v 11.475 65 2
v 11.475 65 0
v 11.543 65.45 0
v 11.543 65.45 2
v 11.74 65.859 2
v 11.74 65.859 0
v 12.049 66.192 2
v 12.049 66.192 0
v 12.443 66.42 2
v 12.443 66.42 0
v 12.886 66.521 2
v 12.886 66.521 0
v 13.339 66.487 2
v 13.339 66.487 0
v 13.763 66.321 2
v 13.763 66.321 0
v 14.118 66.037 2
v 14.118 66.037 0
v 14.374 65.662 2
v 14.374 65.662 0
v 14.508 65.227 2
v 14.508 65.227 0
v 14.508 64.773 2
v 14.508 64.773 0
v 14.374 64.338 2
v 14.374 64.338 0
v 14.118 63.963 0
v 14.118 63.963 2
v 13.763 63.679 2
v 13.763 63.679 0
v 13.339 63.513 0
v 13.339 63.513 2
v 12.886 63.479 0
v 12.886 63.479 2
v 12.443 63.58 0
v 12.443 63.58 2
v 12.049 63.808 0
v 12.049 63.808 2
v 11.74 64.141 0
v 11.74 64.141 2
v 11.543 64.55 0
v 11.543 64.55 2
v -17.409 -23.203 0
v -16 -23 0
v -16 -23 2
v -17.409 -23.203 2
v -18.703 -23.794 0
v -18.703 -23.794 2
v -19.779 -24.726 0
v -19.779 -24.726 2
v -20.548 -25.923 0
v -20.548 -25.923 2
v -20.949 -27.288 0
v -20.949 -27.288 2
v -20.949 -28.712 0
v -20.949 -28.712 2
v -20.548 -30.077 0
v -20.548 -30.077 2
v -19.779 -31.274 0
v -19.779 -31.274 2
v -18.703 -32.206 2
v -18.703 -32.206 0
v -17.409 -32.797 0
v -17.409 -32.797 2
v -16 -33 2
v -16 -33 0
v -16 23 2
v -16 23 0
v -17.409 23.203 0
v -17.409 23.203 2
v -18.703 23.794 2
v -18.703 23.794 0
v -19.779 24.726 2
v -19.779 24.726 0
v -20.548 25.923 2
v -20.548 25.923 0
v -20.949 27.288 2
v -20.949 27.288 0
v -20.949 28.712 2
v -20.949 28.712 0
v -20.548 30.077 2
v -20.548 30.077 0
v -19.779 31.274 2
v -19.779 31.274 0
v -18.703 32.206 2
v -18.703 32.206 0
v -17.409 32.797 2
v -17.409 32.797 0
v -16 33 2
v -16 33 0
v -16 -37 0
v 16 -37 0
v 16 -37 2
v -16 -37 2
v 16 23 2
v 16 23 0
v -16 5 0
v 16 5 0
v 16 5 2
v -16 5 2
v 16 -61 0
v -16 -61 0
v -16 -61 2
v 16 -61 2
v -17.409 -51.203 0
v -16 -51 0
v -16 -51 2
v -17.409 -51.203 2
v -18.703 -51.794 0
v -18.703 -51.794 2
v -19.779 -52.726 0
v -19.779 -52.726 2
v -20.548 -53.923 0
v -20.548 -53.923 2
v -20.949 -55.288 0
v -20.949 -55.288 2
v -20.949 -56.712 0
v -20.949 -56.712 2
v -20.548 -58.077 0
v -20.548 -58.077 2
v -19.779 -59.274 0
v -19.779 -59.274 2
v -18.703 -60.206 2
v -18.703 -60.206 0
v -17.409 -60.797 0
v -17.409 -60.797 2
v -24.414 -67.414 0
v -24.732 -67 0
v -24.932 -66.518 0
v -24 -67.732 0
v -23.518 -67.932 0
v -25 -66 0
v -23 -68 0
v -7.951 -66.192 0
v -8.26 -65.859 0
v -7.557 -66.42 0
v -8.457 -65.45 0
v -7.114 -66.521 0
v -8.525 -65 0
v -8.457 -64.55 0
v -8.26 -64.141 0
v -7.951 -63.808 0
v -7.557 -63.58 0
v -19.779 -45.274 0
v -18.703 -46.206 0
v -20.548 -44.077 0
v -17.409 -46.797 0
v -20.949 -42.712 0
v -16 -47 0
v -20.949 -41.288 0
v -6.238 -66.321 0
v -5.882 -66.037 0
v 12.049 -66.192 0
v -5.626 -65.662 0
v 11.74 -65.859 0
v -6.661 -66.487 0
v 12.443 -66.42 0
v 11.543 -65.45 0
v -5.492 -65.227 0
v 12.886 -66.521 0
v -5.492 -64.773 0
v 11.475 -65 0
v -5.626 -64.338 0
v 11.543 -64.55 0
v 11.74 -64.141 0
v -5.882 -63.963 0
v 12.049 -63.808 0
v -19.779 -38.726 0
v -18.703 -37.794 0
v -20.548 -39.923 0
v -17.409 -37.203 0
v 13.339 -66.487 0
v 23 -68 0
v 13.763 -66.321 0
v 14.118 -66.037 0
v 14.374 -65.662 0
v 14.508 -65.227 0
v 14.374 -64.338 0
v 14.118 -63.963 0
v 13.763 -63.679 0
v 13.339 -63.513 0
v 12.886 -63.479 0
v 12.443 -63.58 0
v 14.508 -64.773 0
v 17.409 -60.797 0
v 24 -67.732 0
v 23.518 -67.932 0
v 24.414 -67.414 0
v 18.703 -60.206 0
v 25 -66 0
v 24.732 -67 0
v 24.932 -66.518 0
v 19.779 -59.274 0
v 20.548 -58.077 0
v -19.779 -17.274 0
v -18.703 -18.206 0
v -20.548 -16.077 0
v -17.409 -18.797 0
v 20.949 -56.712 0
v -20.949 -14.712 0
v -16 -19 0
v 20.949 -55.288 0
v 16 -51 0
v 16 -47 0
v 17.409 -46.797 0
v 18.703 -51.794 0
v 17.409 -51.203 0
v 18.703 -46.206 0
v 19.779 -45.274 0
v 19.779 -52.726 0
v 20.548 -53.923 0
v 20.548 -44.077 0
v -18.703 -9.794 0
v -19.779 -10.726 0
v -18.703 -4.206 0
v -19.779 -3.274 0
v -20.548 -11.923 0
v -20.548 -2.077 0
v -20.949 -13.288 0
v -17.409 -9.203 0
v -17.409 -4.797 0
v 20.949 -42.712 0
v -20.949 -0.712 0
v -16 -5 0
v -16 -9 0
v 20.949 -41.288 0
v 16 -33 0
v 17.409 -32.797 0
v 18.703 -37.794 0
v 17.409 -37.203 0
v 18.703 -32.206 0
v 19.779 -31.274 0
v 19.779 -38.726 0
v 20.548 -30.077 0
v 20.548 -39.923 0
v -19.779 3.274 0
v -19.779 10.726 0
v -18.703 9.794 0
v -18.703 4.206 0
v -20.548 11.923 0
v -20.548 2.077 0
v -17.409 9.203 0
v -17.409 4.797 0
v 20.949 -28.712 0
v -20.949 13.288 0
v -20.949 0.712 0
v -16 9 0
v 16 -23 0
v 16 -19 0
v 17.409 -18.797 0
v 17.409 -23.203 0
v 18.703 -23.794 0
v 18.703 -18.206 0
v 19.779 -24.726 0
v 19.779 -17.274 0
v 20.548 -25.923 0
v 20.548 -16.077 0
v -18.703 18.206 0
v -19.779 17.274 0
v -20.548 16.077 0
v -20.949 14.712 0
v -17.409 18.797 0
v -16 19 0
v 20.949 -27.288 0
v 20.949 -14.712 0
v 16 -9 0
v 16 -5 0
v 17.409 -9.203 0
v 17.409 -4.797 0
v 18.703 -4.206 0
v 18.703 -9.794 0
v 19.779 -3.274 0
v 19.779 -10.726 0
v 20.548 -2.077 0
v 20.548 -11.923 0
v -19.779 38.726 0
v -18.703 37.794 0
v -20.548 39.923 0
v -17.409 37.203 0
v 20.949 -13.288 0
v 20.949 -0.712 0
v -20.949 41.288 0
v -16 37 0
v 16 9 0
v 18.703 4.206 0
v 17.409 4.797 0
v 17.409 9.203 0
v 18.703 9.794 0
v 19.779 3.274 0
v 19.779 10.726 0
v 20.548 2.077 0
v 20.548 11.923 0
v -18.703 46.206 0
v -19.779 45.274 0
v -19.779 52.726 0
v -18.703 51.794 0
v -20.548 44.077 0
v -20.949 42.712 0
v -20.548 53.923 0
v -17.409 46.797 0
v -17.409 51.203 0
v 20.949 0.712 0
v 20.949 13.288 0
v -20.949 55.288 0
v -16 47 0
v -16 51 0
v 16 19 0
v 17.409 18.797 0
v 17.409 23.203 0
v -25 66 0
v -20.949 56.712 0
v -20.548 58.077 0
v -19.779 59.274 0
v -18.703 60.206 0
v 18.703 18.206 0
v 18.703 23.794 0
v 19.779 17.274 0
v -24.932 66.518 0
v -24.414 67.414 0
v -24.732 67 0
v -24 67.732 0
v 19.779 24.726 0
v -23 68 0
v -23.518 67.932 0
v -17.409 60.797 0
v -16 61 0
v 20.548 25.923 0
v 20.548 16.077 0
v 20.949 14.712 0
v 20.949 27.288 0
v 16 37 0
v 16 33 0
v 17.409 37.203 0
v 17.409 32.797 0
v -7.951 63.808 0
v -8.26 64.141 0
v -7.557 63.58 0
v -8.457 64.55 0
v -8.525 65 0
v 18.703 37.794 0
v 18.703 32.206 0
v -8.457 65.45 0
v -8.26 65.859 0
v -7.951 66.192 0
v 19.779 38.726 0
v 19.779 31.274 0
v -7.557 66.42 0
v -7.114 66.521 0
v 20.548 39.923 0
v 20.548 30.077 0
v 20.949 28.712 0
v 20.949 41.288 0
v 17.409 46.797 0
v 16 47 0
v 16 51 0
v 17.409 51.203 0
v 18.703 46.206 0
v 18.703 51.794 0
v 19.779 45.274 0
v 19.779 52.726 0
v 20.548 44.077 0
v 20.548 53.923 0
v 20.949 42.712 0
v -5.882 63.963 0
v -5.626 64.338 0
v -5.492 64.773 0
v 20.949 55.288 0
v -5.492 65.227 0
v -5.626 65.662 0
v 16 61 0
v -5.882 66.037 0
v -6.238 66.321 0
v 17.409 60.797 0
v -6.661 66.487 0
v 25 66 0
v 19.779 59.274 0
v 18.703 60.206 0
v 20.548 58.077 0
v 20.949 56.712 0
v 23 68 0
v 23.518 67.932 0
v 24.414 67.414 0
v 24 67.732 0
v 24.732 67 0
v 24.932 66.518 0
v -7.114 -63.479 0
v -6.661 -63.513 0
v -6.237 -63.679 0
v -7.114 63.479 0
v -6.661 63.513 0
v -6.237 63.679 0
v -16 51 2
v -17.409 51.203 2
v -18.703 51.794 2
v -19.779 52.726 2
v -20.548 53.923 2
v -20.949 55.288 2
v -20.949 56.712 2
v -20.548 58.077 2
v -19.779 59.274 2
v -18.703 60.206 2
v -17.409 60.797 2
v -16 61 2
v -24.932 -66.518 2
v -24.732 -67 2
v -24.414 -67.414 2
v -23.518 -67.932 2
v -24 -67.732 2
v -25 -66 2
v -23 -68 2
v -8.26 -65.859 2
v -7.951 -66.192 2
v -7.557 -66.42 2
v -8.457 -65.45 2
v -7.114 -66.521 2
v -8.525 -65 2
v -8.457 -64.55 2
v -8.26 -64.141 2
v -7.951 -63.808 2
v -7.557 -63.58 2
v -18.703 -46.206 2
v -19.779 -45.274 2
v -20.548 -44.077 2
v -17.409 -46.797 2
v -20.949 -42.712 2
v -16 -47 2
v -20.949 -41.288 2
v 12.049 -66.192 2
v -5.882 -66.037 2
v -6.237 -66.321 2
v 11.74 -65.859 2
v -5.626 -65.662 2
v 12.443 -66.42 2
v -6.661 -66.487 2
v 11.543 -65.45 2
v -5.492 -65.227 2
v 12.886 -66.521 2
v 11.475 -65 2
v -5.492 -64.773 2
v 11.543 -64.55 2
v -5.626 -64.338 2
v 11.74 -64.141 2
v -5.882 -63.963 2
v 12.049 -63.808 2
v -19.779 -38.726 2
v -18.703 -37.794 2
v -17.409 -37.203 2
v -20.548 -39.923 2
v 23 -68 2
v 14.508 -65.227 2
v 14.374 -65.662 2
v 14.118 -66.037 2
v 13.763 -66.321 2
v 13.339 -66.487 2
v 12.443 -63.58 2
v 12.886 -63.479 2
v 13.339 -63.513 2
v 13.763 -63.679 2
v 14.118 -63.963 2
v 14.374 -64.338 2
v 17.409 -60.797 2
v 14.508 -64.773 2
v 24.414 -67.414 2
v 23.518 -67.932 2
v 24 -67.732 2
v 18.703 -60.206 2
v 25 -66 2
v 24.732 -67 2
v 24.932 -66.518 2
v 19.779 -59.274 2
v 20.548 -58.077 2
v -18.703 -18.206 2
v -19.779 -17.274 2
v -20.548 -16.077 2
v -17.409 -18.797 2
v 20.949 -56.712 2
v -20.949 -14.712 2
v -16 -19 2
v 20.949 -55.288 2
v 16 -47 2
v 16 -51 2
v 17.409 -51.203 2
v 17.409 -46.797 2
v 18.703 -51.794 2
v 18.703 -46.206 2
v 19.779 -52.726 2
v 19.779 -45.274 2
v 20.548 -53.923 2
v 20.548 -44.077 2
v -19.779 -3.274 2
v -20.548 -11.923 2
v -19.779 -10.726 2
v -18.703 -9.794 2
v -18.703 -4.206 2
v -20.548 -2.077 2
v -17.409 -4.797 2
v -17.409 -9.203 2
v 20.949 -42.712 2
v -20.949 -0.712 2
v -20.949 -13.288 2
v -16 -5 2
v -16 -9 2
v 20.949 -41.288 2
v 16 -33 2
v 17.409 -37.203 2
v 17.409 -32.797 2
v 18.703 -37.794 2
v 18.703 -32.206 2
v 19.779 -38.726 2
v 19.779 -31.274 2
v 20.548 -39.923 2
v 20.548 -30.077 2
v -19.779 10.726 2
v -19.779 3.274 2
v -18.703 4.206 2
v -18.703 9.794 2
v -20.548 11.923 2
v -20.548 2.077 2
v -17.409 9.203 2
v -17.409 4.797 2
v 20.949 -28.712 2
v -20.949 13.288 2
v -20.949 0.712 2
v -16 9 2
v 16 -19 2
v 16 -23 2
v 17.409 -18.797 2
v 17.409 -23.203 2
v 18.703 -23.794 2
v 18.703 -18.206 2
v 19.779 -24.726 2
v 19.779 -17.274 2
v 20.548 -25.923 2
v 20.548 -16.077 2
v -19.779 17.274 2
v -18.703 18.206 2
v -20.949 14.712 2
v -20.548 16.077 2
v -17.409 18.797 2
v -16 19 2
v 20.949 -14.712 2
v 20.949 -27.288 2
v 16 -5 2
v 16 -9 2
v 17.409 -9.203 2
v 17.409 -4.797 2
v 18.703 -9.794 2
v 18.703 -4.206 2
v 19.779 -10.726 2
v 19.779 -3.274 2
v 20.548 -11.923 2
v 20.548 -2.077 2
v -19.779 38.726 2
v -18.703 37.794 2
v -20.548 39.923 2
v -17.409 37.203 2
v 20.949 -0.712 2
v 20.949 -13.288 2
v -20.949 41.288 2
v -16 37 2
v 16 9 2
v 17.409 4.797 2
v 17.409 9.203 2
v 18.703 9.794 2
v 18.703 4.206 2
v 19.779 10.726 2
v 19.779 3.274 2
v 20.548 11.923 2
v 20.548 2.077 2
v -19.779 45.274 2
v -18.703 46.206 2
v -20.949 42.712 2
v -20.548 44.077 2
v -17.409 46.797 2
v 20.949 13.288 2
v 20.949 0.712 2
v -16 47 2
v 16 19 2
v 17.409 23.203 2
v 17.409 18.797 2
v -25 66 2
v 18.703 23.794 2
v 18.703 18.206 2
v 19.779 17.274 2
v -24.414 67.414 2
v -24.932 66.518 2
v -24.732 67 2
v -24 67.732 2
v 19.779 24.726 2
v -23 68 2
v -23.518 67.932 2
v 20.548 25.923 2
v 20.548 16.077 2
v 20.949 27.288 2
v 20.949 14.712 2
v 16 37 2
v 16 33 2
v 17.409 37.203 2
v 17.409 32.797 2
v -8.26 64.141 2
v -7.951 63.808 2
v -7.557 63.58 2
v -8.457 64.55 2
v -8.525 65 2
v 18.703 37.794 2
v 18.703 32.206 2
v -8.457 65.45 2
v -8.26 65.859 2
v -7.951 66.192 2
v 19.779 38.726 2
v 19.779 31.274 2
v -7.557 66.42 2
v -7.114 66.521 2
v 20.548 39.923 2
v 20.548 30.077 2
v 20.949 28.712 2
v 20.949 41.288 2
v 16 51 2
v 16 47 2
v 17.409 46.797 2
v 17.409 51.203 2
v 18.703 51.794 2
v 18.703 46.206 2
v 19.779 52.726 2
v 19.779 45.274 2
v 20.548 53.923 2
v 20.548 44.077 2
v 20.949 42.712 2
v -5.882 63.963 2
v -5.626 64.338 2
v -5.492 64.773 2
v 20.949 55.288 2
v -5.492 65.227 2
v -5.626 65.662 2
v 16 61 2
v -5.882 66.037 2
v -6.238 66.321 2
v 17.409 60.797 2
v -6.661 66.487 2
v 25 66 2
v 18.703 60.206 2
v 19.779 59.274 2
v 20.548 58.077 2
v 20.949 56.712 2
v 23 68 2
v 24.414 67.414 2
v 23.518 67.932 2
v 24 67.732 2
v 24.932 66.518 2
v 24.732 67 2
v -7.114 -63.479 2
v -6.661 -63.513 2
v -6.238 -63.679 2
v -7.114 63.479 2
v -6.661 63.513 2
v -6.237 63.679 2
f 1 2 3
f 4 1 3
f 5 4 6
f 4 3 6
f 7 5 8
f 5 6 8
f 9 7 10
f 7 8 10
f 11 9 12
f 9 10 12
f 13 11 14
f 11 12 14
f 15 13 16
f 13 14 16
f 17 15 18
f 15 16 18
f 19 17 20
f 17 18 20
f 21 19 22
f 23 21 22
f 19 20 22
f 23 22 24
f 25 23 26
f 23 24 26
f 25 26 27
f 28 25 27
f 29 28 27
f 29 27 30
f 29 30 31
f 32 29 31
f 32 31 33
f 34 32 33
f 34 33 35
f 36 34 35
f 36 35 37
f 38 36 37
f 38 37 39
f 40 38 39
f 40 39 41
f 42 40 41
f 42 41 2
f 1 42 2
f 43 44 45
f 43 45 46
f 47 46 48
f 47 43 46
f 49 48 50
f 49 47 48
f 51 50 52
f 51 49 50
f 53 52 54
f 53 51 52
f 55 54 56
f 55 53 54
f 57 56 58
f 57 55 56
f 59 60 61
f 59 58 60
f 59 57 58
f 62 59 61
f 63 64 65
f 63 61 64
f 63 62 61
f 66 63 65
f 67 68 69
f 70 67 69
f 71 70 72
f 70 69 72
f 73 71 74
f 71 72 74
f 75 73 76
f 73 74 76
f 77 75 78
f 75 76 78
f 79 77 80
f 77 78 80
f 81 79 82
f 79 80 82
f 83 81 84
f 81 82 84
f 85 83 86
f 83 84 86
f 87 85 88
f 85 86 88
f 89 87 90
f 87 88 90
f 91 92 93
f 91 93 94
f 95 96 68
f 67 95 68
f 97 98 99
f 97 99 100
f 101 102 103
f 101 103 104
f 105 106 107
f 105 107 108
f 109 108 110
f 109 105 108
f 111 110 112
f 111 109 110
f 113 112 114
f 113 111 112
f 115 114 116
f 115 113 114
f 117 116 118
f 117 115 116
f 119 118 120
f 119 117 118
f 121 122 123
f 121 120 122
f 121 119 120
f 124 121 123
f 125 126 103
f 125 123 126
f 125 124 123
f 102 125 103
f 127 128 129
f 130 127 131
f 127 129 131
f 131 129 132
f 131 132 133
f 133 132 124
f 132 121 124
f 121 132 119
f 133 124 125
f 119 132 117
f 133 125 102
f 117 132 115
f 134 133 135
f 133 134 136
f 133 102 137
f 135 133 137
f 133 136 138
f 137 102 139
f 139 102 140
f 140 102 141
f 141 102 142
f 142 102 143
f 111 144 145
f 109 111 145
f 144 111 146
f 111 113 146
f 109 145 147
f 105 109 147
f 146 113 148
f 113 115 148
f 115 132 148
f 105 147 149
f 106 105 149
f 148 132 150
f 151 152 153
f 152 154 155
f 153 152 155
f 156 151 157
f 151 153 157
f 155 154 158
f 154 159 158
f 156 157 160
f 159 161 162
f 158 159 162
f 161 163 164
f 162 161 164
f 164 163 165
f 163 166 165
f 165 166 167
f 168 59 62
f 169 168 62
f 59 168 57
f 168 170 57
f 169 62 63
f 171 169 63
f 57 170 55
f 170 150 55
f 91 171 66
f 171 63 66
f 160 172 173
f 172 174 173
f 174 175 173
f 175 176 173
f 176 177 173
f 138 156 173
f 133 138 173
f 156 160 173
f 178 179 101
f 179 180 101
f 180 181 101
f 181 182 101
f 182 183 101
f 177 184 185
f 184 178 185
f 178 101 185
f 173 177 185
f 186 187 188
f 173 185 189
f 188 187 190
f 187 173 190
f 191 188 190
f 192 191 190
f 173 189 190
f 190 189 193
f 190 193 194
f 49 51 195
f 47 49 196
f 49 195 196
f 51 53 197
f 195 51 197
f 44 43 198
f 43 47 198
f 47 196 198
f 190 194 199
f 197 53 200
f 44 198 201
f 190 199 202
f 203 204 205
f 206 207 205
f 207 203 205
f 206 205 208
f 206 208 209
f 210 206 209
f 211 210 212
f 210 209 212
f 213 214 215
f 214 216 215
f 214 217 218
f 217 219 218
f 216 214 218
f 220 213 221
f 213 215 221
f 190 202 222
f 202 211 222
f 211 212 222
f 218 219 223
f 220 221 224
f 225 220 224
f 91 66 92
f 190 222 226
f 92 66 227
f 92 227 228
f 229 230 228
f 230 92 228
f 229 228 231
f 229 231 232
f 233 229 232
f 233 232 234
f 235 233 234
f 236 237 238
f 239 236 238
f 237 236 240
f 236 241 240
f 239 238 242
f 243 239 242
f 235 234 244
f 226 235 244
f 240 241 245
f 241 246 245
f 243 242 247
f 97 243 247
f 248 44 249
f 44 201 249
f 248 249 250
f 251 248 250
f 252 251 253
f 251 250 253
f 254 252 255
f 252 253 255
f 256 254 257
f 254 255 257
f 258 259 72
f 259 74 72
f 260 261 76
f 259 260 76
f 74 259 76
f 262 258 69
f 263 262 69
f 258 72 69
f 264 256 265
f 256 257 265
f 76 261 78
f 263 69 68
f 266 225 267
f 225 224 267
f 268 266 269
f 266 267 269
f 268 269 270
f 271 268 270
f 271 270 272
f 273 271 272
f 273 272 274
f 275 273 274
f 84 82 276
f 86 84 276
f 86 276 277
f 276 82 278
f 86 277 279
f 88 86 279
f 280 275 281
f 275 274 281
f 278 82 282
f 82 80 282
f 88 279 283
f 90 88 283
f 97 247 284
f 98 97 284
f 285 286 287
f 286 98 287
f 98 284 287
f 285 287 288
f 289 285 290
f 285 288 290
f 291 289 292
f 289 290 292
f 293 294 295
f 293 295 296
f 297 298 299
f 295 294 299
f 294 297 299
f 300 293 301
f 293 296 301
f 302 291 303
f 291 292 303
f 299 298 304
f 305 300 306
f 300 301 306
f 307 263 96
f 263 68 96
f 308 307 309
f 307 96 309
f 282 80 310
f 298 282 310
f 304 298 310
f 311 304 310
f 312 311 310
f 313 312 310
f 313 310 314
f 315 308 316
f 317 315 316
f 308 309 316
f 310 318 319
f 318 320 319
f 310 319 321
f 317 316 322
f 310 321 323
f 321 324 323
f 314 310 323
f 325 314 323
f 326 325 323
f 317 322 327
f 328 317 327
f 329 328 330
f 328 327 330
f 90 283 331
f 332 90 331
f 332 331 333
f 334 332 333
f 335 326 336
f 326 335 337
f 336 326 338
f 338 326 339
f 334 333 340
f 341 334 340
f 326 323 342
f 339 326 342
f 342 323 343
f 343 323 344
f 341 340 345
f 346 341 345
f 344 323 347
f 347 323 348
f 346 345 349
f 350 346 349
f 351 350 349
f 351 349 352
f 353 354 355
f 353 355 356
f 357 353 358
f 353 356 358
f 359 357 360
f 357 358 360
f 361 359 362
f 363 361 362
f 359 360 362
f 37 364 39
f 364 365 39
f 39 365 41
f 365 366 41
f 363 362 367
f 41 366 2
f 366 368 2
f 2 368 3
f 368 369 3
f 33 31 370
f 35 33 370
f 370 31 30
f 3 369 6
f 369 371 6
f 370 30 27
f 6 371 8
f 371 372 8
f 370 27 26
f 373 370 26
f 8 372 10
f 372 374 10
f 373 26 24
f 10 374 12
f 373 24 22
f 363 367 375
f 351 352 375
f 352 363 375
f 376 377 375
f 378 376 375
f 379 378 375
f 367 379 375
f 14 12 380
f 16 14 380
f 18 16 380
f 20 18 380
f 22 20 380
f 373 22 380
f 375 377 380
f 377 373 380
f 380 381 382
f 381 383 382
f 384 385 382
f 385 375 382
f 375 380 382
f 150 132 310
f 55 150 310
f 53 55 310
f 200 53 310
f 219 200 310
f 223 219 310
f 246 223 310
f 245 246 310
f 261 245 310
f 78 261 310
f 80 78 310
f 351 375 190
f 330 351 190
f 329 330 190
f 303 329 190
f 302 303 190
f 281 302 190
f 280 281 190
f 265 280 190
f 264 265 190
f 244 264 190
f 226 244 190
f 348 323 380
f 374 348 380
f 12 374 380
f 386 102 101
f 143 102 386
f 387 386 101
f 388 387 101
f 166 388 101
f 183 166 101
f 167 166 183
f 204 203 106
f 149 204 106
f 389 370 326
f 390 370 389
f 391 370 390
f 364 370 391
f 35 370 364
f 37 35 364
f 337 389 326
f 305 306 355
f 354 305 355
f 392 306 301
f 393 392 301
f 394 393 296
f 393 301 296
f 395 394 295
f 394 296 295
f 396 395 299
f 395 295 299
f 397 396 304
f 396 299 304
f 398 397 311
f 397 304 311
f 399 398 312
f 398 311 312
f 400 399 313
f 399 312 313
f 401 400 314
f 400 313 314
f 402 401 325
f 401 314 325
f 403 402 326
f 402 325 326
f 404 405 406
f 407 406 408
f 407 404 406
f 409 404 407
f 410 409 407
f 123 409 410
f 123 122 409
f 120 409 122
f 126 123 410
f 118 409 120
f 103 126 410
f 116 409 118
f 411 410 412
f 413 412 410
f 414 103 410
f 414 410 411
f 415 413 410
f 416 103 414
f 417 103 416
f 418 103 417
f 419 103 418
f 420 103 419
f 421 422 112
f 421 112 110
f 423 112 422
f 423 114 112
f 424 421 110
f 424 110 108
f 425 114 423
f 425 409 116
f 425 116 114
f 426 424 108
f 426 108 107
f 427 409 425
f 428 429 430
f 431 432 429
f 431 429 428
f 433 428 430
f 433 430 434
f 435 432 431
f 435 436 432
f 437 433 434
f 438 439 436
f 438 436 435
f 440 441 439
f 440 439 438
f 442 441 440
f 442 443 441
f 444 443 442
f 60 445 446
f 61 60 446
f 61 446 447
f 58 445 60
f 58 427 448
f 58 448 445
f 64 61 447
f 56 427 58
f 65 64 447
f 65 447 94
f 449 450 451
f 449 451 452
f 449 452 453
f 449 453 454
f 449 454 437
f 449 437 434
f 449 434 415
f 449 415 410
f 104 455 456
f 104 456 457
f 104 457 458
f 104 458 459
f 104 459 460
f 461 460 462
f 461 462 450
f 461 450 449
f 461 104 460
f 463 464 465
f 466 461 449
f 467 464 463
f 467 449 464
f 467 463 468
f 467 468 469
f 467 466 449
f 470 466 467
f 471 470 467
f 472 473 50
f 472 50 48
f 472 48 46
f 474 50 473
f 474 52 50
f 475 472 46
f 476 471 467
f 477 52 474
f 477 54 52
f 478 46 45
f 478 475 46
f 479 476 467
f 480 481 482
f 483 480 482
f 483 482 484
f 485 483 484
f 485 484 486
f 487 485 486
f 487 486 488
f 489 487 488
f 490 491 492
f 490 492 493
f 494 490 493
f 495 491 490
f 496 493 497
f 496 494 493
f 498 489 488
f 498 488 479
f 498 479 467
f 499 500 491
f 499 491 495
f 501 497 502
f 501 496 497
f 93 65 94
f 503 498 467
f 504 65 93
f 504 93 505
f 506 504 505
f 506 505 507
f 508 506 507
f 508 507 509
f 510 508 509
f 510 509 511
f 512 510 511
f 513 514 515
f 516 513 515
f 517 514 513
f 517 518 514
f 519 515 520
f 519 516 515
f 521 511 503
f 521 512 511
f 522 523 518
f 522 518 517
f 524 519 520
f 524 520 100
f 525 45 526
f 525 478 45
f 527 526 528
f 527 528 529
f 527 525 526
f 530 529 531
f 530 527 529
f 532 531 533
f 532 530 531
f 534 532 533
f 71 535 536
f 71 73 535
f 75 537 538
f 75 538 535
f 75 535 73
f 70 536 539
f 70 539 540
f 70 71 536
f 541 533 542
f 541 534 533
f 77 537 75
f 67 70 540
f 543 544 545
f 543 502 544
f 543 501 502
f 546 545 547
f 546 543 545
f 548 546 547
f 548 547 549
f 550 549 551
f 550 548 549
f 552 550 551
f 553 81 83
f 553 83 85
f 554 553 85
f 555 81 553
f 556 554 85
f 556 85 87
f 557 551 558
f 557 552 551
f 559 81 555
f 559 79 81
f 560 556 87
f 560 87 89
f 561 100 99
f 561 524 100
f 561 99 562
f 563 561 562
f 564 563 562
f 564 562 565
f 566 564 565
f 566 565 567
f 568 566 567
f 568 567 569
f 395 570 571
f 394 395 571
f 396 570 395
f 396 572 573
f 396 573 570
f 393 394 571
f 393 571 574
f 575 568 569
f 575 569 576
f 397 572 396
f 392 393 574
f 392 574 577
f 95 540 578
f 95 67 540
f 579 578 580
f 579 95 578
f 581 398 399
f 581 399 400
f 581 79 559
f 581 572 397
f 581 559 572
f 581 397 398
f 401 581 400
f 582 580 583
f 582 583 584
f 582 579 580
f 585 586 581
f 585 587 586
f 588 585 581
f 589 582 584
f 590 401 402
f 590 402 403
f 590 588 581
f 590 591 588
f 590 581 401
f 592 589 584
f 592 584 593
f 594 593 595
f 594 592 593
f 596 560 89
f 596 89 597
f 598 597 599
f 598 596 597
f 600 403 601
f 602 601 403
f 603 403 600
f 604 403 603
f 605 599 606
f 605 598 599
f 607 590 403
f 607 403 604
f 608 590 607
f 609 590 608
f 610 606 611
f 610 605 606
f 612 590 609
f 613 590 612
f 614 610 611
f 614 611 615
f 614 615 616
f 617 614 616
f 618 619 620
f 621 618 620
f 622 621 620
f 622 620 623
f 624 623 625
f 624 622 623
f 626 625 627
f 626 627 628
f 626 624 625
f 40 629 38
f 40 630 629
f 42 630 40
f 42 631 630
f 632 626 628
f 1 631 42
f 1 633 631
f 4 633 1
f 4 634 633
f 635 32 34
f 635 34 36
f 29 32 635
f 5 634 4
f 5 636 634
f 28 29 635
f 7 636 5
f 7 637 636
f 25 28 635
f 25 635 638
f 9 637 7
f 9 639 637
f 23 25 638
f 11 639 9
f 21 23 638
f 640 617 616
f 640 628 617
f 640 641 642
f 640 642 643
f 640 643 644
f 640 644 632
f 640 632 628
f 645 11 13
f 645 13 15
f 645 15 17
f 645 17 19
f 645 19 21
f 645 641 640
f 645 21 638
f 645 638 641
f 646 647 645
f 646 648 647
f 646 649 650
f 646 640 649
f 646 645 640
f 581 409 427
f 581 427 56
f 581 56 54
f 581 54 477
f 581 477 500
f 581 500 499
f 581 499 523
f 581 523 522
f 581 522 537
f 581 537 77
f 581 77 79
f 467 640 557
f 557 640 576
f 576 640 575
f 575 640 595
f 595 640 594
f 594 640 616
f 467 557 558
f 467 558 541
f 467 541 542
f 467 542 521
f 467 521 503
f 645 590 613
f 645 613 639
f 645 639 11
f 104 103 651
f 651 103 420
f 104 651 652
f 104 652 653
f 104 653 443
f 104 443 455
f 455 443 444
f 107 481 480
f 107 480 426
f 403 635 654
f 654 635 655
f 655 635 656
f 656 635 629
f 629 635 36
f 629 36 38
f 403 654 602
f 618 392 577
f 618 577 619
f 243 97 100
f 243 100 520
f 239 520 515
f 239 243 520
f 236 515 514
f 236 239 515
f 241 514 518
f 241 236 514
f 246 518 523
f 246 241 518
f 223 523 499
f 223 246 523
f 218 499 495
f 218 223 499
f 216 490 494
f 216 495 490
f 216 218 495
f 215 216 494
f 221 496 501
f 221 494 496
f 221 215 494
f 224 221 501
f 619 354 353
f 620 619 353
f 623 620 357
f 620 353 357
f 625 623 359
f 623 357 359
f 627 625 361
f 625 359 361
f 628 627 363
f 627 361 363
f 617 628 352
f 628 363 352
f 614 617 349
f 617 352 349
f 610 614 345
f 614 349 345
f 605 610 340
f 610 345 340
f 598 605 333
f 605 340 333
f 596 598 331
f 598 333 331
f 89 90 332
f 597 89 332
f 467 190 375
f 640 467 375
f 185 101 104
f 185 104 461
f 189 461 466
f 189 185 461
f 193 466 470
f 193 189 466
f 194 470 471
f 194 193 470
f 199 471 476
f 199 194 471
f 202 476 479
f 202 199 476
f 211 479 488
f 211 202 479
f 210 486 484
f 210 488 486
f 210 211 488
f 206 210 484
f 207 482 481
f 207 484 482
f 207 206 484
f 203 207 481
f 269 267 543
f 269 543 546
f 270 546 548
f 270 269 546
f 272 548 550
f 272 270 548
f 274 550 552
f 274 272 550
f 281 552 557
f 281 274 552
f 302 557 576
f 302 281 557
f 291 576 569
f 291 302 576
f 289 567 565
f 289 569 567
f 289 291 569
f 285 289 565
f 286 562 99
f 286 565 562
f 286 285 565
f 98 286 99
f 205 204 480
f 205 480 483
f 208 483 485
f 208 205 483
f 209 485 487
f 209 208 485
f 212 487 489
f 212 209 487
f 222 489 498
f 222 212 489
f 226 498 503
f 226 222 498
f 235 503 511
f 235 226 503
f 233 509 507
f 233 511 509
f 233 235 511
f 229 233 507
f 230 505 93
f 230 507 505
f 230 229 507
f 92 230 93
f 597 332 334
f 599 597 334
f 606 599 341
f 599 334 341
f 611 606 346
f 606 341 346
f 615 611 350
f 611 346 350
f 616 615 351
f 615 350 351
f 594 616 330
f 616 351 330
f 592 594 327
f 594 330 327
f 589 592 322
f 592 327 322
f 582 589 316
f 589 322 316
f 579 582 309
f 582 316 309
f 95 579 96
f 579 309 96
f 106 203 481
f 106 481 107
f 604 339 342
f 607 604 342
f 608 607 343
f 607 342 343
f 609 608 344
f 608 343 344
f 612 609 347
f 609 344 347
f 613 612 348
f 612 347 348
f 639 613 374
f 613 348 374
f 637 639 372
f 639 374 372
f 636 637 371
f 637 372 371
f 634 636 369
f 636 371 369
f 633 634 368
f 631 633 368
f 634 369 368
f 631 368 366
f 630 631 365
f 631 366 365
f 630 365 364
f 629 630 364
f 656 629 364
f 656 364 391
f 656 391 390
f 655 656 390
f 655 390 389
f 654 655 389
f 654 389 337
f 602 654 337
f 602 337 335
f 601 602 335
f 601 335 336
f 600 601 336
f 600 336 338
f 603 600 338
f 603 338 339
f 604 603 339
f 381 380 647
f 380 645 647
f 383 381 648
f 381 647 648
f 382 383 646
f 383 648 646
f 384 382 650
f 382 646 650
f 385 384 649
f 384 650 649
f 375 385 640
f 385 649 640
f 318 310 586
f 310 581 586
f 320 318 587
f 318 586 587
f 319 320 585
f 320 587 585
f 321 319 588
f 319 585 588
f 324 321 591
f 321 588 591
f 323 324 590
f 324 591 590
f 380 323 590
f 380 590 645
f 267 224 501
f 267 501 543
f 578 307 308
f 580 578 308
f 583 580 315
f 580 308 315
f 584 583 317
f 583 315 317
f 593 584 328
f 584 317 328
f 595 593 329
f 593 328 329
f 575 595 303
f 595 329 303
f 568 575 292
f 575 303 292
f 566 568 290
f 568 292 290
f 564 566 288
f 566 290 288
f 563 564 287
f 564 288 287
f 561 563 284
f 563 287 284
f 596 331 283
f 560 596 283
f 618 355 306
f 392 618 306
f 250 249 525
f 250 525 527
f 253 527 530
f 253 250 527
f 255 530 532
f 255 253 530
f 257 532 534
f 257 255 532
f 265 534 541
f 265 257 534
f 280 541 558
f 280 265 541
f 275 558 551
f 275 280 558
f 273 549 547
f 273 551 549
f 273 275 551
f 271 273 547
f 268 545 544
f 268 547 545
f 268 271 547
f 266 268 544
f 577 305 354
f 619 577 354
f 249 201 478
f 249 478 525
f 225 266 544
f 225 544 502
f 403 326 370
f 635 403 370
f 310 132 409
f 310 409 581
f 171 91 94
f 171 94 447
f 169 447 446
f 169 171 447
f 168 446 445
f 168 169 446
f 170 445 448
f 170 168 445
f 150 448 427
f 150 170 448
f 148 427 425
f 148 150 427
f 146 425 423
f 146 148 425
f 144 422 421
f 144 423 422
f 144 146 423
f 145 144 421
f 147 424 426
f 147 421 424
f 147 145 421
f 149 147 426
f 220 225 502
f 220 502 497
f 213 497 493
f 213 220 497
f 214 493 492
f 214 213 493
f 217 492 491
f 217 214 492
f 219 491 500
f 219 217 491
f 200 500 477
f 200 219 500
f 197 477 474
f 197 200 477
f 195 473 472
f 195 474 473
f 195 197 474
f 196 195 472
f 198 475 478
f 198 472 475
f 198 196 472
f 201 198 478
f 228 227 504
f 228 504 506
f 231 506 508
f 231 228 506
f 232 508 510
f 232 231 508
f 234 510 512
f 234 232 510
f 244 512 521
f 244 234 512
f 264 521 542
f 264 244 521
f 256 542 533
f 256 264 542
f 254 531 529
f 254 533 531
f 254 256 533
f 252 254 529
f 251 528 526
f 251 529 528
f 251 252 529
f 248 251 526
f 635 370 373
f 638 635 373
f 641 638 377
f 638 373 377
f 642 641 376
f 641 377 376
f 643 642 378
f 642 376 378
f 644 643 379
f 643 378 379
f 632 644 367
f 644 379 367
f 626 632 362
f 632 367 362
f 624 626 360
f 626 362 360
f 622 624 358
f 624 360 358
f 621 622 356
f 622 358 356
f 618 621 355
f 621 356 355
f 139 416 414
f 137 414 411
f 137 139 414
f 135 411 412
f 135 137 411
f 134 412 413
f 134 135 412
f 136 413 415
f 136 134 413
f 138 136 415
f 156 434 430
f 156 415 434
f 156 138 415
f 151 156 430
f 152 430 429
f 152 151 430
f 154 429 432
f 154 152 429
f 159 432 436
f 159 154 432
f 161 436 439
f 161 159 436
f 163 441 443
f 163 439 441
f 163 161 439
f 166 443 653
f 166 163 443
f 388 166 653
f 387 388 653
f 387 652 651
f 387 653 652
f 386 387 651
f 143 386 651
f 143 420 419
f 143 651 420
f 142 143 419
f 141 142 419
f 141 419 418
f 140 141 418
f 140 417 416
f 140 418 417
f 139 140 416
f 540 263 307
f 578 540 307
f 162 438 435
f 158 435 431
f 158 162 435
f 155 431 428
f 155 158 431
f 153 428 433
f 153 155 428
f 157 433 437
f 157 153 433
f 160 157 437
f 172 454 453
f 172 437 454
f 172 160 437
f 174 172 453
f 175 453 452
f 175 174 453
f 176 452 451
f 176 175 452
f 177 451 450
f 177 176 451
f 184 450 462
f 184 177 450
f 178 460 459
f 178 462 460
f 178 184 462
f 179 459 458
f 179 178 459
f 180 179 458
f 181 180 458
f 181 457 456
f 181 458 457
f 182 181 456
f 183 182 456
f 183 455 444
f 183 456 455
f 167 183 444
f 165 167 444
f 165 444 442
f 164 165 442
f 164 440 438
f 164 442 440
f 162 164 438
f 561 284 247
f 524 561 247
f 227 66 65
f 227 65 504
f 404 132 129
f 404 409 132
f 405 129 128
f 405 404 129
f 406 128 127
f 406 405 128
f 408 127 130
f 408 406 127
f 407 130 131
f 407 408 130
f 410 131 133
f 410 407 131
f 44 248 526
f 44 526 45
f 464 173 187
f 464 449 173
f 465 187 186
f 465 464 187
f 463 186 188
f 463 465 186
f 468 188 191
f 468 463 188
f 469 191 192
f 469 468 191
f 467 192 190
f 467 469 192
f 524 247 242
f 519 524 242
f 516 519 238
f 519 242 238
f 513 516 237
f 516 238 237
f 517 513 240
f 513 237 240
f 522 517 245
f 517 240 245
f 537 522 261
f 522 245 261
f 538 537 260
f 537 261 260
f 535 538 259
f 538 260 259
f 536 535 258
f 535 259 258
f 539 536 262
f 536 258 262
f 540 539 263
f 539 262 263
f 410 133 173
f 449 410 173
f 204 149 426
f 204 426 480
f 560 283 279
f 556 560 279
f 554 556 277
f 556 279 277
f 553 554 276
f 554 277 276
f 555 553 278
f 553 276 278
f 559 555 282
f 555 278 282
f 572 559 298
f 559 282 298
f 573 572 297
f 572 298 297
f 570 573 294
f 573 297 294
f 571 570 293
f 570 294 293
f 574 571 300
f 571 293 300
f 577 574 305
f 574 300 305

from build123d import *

# Parameters (mm, degrees)
SKETCH_1_W             = 50
SKETCH_1_H             = 136
EXTRUDE_1_DEPTH        = 2
SKETCH_3_R             = 1.525
CUT_EXTRUDE_1_DEPTH    = 10
CUT_EXTRUDE_2_DEPTH    = 22
PATTERN_LINEAR_1_COUNT = 5
PATTERN_LINEAR_1_PITCH = 14
MIRROR_2_COPY_1_DEPTH  = 22
MIRROR_2_COPY_2_DEPTH  = 22
MIRROR_2_COPY_3_DEPTH  = 22
MIRROR_2_COPY_4_DEPTH  = 22
MIRROR_2_COPY_5_DEPTH  = 22
FILLET_1_R             = 2


with BuildPart() as part:
    # 草图1 → 凸台-拉伸1 (new body)
    with BuildSketch(Plane.XY):
        Rectangle(SKETCH_1_W, SKETCH_1_H)
    extrude(amount=EXTRUDE_1_DEPTH)

    # 草图3 → 切除-拉伸1 (cut)
    with BuildSketch(Plane(origin=(0, 0, 0), x_dir=(-1, 0, 0), z_dir=(0, 0, -1))):
        with Locations((-13, 65)):
            Circle(SKETCH_3_R)
        with Locations((7, 65)):
            Circle(SKETCH_3_R)
    cut_extrude_1 = extrude(amount=-CUT_EXTRUDE_1_DEPTH, mode=Mode.SUBTRACT)

    # 镜向1: 切除-拉伸1 across plane
    add(cut_extrude_1.mirror(Plane.ZX), mode=Mode.SUBTRACT)

    # 草图4 → 切除-拉伸2 (cut)
    with BuildSketch(Plane(origin=(0, 0, 0), x_dir=(-1, 0, 0), z_dir=(0, 0, -1))):
        with BuildLine():
            Line((16, -5), (-16, -5))
            ThreePointArc((-16, -5), (-21, 0), (-16, 5))
            Line((-16, 5), (16, 5))
            ThreePointArc((16, 5), (21, 0), (16, -5))
        make_face()
    cut_extrude_2 = extrude(amount=-CUT_EXTRUDE_2_DEPTH, mode=Mode.SUBTRACT)

    # 阵列(线性)1: 切除-拉伸2 ×5
    with Locations(*[(0, -i * PATTERN_LINEAR_1_PITCH, 0) for i in range(1, PATTERN_LINEAR_1_COUNT)]):
        add(cut_extrude_2, mode=Mode.SUBTRACT)

    # 镜向2 copy 1 sketch → 镜向2 copy 1 (cut)
    with BuildSketch(Plane(origin=(0, 14, 0), x_dir=(-1, 0, 0), z_dir=(0, 0, -1))):
        with BuildLine():
            Line((16, 5), (-16, 5))
            ThreePointArc((-16, 5), (-21, 0), (-16, -5))
            Line((-16, -5), (16, -5))
            ThreePointArc((16, -5), (21, 0), (16, 5))
        make_face()
    extrude(amount=-MIRROR_2_COPY_1_DEPTH, mode=Mode.SUBTRACT)

    # 镜向2 copy 2 sketch → 镜向2 copy 2 (cut)
    with BuildSketch(Plane(origin=(0, 28, 0), x_dir=(-1, 0, 0), z_dir=(0, 0, -1))):
        with BuildLine():
            Line((16, 5), (-16, 5))
            ThreePointArc((-16, 5), (-21, 0), (-16, -5))
            Line((-16, -5), (16, -5))
            ThreePointArc((16, -5), (21, 0), (16, 5))
        make_face()
    extrude(amount=-MIRROR_2_COPY_2_DEPTH, mode=Mode.SUBTRACT)

    # 镜向2 copy 3 sketch → 镜向2 copy 3 (cut)
    with BuildSketch(Plane(origin=(0, 42, 0), x_dir=(-1, 0, 0), z_dir=(0, 0, -1))):
        with BuildLine():
            Line((16, 5), (-16, 5))
            ThreePointArc((-16, 5), (-21, 0), (-16, -5))
            Line((-16, -5), (16, -5))
            ThreePointArc((16, -5), (21, 0), (16, 5))
        make_face()
    extrude(amount=-MIRROR_2_COPY_3_DEPTH, mode=Mode.SUBTRACT)

    # 镜向2 copy 4 sketch → 镜向2 copy 4 (cut)
    with BuildSketch(Plane(origin=(0, 56, 0), x_dir=(-1, 0, 0), z_dir=(0, 0, -1))):
        with BuildLine():
            Line((16, 5), (-16, 5))
            ThreePointArc((-16, 5), (-21, 0), (-16, -5))
            Line((-16, -5), (16, -5))
            ThreePointArc((16, -5), (21, 0), (16, 5))
        make_face()
    extrude(amount=-MIRROR_2_COPY_4_DEPTH, mode=Mode.SUBTRACT)

    # 镜向2 copy 5 sketch → 镜向2 copy 5 (cut)
    with BuildSketch(Plane(origin=(0, 0, 0), x_dir=(-1, 0, 0), z_dir=(0, 0, -1))):
        with BuildLine():
            Line((16, 5), (-16, 5))
            ThreePointArc((-16, 5), (-21, 0), (-16, -5))
            Line((-16, -5), (16, -5))
            ThreePointArc((16, -5), (21, 0), (16, 5))
        make_face()
    extrude(amount=-MIRROR_2_COPY_5_DEPTH, mode=Mode.SUBTRACT)

    # 圆角1
    fillet_1_edges = [part.edges().sort_by_distance(p)[0] for p in [
        (25, -68, 1),
        (-25, -68, 1),
        (-25, 68, 1),
        (25, 68, 1),
    ]]
    fillet(fillet_1_edges, radius=FILLET_1_R)


solid = part.part
